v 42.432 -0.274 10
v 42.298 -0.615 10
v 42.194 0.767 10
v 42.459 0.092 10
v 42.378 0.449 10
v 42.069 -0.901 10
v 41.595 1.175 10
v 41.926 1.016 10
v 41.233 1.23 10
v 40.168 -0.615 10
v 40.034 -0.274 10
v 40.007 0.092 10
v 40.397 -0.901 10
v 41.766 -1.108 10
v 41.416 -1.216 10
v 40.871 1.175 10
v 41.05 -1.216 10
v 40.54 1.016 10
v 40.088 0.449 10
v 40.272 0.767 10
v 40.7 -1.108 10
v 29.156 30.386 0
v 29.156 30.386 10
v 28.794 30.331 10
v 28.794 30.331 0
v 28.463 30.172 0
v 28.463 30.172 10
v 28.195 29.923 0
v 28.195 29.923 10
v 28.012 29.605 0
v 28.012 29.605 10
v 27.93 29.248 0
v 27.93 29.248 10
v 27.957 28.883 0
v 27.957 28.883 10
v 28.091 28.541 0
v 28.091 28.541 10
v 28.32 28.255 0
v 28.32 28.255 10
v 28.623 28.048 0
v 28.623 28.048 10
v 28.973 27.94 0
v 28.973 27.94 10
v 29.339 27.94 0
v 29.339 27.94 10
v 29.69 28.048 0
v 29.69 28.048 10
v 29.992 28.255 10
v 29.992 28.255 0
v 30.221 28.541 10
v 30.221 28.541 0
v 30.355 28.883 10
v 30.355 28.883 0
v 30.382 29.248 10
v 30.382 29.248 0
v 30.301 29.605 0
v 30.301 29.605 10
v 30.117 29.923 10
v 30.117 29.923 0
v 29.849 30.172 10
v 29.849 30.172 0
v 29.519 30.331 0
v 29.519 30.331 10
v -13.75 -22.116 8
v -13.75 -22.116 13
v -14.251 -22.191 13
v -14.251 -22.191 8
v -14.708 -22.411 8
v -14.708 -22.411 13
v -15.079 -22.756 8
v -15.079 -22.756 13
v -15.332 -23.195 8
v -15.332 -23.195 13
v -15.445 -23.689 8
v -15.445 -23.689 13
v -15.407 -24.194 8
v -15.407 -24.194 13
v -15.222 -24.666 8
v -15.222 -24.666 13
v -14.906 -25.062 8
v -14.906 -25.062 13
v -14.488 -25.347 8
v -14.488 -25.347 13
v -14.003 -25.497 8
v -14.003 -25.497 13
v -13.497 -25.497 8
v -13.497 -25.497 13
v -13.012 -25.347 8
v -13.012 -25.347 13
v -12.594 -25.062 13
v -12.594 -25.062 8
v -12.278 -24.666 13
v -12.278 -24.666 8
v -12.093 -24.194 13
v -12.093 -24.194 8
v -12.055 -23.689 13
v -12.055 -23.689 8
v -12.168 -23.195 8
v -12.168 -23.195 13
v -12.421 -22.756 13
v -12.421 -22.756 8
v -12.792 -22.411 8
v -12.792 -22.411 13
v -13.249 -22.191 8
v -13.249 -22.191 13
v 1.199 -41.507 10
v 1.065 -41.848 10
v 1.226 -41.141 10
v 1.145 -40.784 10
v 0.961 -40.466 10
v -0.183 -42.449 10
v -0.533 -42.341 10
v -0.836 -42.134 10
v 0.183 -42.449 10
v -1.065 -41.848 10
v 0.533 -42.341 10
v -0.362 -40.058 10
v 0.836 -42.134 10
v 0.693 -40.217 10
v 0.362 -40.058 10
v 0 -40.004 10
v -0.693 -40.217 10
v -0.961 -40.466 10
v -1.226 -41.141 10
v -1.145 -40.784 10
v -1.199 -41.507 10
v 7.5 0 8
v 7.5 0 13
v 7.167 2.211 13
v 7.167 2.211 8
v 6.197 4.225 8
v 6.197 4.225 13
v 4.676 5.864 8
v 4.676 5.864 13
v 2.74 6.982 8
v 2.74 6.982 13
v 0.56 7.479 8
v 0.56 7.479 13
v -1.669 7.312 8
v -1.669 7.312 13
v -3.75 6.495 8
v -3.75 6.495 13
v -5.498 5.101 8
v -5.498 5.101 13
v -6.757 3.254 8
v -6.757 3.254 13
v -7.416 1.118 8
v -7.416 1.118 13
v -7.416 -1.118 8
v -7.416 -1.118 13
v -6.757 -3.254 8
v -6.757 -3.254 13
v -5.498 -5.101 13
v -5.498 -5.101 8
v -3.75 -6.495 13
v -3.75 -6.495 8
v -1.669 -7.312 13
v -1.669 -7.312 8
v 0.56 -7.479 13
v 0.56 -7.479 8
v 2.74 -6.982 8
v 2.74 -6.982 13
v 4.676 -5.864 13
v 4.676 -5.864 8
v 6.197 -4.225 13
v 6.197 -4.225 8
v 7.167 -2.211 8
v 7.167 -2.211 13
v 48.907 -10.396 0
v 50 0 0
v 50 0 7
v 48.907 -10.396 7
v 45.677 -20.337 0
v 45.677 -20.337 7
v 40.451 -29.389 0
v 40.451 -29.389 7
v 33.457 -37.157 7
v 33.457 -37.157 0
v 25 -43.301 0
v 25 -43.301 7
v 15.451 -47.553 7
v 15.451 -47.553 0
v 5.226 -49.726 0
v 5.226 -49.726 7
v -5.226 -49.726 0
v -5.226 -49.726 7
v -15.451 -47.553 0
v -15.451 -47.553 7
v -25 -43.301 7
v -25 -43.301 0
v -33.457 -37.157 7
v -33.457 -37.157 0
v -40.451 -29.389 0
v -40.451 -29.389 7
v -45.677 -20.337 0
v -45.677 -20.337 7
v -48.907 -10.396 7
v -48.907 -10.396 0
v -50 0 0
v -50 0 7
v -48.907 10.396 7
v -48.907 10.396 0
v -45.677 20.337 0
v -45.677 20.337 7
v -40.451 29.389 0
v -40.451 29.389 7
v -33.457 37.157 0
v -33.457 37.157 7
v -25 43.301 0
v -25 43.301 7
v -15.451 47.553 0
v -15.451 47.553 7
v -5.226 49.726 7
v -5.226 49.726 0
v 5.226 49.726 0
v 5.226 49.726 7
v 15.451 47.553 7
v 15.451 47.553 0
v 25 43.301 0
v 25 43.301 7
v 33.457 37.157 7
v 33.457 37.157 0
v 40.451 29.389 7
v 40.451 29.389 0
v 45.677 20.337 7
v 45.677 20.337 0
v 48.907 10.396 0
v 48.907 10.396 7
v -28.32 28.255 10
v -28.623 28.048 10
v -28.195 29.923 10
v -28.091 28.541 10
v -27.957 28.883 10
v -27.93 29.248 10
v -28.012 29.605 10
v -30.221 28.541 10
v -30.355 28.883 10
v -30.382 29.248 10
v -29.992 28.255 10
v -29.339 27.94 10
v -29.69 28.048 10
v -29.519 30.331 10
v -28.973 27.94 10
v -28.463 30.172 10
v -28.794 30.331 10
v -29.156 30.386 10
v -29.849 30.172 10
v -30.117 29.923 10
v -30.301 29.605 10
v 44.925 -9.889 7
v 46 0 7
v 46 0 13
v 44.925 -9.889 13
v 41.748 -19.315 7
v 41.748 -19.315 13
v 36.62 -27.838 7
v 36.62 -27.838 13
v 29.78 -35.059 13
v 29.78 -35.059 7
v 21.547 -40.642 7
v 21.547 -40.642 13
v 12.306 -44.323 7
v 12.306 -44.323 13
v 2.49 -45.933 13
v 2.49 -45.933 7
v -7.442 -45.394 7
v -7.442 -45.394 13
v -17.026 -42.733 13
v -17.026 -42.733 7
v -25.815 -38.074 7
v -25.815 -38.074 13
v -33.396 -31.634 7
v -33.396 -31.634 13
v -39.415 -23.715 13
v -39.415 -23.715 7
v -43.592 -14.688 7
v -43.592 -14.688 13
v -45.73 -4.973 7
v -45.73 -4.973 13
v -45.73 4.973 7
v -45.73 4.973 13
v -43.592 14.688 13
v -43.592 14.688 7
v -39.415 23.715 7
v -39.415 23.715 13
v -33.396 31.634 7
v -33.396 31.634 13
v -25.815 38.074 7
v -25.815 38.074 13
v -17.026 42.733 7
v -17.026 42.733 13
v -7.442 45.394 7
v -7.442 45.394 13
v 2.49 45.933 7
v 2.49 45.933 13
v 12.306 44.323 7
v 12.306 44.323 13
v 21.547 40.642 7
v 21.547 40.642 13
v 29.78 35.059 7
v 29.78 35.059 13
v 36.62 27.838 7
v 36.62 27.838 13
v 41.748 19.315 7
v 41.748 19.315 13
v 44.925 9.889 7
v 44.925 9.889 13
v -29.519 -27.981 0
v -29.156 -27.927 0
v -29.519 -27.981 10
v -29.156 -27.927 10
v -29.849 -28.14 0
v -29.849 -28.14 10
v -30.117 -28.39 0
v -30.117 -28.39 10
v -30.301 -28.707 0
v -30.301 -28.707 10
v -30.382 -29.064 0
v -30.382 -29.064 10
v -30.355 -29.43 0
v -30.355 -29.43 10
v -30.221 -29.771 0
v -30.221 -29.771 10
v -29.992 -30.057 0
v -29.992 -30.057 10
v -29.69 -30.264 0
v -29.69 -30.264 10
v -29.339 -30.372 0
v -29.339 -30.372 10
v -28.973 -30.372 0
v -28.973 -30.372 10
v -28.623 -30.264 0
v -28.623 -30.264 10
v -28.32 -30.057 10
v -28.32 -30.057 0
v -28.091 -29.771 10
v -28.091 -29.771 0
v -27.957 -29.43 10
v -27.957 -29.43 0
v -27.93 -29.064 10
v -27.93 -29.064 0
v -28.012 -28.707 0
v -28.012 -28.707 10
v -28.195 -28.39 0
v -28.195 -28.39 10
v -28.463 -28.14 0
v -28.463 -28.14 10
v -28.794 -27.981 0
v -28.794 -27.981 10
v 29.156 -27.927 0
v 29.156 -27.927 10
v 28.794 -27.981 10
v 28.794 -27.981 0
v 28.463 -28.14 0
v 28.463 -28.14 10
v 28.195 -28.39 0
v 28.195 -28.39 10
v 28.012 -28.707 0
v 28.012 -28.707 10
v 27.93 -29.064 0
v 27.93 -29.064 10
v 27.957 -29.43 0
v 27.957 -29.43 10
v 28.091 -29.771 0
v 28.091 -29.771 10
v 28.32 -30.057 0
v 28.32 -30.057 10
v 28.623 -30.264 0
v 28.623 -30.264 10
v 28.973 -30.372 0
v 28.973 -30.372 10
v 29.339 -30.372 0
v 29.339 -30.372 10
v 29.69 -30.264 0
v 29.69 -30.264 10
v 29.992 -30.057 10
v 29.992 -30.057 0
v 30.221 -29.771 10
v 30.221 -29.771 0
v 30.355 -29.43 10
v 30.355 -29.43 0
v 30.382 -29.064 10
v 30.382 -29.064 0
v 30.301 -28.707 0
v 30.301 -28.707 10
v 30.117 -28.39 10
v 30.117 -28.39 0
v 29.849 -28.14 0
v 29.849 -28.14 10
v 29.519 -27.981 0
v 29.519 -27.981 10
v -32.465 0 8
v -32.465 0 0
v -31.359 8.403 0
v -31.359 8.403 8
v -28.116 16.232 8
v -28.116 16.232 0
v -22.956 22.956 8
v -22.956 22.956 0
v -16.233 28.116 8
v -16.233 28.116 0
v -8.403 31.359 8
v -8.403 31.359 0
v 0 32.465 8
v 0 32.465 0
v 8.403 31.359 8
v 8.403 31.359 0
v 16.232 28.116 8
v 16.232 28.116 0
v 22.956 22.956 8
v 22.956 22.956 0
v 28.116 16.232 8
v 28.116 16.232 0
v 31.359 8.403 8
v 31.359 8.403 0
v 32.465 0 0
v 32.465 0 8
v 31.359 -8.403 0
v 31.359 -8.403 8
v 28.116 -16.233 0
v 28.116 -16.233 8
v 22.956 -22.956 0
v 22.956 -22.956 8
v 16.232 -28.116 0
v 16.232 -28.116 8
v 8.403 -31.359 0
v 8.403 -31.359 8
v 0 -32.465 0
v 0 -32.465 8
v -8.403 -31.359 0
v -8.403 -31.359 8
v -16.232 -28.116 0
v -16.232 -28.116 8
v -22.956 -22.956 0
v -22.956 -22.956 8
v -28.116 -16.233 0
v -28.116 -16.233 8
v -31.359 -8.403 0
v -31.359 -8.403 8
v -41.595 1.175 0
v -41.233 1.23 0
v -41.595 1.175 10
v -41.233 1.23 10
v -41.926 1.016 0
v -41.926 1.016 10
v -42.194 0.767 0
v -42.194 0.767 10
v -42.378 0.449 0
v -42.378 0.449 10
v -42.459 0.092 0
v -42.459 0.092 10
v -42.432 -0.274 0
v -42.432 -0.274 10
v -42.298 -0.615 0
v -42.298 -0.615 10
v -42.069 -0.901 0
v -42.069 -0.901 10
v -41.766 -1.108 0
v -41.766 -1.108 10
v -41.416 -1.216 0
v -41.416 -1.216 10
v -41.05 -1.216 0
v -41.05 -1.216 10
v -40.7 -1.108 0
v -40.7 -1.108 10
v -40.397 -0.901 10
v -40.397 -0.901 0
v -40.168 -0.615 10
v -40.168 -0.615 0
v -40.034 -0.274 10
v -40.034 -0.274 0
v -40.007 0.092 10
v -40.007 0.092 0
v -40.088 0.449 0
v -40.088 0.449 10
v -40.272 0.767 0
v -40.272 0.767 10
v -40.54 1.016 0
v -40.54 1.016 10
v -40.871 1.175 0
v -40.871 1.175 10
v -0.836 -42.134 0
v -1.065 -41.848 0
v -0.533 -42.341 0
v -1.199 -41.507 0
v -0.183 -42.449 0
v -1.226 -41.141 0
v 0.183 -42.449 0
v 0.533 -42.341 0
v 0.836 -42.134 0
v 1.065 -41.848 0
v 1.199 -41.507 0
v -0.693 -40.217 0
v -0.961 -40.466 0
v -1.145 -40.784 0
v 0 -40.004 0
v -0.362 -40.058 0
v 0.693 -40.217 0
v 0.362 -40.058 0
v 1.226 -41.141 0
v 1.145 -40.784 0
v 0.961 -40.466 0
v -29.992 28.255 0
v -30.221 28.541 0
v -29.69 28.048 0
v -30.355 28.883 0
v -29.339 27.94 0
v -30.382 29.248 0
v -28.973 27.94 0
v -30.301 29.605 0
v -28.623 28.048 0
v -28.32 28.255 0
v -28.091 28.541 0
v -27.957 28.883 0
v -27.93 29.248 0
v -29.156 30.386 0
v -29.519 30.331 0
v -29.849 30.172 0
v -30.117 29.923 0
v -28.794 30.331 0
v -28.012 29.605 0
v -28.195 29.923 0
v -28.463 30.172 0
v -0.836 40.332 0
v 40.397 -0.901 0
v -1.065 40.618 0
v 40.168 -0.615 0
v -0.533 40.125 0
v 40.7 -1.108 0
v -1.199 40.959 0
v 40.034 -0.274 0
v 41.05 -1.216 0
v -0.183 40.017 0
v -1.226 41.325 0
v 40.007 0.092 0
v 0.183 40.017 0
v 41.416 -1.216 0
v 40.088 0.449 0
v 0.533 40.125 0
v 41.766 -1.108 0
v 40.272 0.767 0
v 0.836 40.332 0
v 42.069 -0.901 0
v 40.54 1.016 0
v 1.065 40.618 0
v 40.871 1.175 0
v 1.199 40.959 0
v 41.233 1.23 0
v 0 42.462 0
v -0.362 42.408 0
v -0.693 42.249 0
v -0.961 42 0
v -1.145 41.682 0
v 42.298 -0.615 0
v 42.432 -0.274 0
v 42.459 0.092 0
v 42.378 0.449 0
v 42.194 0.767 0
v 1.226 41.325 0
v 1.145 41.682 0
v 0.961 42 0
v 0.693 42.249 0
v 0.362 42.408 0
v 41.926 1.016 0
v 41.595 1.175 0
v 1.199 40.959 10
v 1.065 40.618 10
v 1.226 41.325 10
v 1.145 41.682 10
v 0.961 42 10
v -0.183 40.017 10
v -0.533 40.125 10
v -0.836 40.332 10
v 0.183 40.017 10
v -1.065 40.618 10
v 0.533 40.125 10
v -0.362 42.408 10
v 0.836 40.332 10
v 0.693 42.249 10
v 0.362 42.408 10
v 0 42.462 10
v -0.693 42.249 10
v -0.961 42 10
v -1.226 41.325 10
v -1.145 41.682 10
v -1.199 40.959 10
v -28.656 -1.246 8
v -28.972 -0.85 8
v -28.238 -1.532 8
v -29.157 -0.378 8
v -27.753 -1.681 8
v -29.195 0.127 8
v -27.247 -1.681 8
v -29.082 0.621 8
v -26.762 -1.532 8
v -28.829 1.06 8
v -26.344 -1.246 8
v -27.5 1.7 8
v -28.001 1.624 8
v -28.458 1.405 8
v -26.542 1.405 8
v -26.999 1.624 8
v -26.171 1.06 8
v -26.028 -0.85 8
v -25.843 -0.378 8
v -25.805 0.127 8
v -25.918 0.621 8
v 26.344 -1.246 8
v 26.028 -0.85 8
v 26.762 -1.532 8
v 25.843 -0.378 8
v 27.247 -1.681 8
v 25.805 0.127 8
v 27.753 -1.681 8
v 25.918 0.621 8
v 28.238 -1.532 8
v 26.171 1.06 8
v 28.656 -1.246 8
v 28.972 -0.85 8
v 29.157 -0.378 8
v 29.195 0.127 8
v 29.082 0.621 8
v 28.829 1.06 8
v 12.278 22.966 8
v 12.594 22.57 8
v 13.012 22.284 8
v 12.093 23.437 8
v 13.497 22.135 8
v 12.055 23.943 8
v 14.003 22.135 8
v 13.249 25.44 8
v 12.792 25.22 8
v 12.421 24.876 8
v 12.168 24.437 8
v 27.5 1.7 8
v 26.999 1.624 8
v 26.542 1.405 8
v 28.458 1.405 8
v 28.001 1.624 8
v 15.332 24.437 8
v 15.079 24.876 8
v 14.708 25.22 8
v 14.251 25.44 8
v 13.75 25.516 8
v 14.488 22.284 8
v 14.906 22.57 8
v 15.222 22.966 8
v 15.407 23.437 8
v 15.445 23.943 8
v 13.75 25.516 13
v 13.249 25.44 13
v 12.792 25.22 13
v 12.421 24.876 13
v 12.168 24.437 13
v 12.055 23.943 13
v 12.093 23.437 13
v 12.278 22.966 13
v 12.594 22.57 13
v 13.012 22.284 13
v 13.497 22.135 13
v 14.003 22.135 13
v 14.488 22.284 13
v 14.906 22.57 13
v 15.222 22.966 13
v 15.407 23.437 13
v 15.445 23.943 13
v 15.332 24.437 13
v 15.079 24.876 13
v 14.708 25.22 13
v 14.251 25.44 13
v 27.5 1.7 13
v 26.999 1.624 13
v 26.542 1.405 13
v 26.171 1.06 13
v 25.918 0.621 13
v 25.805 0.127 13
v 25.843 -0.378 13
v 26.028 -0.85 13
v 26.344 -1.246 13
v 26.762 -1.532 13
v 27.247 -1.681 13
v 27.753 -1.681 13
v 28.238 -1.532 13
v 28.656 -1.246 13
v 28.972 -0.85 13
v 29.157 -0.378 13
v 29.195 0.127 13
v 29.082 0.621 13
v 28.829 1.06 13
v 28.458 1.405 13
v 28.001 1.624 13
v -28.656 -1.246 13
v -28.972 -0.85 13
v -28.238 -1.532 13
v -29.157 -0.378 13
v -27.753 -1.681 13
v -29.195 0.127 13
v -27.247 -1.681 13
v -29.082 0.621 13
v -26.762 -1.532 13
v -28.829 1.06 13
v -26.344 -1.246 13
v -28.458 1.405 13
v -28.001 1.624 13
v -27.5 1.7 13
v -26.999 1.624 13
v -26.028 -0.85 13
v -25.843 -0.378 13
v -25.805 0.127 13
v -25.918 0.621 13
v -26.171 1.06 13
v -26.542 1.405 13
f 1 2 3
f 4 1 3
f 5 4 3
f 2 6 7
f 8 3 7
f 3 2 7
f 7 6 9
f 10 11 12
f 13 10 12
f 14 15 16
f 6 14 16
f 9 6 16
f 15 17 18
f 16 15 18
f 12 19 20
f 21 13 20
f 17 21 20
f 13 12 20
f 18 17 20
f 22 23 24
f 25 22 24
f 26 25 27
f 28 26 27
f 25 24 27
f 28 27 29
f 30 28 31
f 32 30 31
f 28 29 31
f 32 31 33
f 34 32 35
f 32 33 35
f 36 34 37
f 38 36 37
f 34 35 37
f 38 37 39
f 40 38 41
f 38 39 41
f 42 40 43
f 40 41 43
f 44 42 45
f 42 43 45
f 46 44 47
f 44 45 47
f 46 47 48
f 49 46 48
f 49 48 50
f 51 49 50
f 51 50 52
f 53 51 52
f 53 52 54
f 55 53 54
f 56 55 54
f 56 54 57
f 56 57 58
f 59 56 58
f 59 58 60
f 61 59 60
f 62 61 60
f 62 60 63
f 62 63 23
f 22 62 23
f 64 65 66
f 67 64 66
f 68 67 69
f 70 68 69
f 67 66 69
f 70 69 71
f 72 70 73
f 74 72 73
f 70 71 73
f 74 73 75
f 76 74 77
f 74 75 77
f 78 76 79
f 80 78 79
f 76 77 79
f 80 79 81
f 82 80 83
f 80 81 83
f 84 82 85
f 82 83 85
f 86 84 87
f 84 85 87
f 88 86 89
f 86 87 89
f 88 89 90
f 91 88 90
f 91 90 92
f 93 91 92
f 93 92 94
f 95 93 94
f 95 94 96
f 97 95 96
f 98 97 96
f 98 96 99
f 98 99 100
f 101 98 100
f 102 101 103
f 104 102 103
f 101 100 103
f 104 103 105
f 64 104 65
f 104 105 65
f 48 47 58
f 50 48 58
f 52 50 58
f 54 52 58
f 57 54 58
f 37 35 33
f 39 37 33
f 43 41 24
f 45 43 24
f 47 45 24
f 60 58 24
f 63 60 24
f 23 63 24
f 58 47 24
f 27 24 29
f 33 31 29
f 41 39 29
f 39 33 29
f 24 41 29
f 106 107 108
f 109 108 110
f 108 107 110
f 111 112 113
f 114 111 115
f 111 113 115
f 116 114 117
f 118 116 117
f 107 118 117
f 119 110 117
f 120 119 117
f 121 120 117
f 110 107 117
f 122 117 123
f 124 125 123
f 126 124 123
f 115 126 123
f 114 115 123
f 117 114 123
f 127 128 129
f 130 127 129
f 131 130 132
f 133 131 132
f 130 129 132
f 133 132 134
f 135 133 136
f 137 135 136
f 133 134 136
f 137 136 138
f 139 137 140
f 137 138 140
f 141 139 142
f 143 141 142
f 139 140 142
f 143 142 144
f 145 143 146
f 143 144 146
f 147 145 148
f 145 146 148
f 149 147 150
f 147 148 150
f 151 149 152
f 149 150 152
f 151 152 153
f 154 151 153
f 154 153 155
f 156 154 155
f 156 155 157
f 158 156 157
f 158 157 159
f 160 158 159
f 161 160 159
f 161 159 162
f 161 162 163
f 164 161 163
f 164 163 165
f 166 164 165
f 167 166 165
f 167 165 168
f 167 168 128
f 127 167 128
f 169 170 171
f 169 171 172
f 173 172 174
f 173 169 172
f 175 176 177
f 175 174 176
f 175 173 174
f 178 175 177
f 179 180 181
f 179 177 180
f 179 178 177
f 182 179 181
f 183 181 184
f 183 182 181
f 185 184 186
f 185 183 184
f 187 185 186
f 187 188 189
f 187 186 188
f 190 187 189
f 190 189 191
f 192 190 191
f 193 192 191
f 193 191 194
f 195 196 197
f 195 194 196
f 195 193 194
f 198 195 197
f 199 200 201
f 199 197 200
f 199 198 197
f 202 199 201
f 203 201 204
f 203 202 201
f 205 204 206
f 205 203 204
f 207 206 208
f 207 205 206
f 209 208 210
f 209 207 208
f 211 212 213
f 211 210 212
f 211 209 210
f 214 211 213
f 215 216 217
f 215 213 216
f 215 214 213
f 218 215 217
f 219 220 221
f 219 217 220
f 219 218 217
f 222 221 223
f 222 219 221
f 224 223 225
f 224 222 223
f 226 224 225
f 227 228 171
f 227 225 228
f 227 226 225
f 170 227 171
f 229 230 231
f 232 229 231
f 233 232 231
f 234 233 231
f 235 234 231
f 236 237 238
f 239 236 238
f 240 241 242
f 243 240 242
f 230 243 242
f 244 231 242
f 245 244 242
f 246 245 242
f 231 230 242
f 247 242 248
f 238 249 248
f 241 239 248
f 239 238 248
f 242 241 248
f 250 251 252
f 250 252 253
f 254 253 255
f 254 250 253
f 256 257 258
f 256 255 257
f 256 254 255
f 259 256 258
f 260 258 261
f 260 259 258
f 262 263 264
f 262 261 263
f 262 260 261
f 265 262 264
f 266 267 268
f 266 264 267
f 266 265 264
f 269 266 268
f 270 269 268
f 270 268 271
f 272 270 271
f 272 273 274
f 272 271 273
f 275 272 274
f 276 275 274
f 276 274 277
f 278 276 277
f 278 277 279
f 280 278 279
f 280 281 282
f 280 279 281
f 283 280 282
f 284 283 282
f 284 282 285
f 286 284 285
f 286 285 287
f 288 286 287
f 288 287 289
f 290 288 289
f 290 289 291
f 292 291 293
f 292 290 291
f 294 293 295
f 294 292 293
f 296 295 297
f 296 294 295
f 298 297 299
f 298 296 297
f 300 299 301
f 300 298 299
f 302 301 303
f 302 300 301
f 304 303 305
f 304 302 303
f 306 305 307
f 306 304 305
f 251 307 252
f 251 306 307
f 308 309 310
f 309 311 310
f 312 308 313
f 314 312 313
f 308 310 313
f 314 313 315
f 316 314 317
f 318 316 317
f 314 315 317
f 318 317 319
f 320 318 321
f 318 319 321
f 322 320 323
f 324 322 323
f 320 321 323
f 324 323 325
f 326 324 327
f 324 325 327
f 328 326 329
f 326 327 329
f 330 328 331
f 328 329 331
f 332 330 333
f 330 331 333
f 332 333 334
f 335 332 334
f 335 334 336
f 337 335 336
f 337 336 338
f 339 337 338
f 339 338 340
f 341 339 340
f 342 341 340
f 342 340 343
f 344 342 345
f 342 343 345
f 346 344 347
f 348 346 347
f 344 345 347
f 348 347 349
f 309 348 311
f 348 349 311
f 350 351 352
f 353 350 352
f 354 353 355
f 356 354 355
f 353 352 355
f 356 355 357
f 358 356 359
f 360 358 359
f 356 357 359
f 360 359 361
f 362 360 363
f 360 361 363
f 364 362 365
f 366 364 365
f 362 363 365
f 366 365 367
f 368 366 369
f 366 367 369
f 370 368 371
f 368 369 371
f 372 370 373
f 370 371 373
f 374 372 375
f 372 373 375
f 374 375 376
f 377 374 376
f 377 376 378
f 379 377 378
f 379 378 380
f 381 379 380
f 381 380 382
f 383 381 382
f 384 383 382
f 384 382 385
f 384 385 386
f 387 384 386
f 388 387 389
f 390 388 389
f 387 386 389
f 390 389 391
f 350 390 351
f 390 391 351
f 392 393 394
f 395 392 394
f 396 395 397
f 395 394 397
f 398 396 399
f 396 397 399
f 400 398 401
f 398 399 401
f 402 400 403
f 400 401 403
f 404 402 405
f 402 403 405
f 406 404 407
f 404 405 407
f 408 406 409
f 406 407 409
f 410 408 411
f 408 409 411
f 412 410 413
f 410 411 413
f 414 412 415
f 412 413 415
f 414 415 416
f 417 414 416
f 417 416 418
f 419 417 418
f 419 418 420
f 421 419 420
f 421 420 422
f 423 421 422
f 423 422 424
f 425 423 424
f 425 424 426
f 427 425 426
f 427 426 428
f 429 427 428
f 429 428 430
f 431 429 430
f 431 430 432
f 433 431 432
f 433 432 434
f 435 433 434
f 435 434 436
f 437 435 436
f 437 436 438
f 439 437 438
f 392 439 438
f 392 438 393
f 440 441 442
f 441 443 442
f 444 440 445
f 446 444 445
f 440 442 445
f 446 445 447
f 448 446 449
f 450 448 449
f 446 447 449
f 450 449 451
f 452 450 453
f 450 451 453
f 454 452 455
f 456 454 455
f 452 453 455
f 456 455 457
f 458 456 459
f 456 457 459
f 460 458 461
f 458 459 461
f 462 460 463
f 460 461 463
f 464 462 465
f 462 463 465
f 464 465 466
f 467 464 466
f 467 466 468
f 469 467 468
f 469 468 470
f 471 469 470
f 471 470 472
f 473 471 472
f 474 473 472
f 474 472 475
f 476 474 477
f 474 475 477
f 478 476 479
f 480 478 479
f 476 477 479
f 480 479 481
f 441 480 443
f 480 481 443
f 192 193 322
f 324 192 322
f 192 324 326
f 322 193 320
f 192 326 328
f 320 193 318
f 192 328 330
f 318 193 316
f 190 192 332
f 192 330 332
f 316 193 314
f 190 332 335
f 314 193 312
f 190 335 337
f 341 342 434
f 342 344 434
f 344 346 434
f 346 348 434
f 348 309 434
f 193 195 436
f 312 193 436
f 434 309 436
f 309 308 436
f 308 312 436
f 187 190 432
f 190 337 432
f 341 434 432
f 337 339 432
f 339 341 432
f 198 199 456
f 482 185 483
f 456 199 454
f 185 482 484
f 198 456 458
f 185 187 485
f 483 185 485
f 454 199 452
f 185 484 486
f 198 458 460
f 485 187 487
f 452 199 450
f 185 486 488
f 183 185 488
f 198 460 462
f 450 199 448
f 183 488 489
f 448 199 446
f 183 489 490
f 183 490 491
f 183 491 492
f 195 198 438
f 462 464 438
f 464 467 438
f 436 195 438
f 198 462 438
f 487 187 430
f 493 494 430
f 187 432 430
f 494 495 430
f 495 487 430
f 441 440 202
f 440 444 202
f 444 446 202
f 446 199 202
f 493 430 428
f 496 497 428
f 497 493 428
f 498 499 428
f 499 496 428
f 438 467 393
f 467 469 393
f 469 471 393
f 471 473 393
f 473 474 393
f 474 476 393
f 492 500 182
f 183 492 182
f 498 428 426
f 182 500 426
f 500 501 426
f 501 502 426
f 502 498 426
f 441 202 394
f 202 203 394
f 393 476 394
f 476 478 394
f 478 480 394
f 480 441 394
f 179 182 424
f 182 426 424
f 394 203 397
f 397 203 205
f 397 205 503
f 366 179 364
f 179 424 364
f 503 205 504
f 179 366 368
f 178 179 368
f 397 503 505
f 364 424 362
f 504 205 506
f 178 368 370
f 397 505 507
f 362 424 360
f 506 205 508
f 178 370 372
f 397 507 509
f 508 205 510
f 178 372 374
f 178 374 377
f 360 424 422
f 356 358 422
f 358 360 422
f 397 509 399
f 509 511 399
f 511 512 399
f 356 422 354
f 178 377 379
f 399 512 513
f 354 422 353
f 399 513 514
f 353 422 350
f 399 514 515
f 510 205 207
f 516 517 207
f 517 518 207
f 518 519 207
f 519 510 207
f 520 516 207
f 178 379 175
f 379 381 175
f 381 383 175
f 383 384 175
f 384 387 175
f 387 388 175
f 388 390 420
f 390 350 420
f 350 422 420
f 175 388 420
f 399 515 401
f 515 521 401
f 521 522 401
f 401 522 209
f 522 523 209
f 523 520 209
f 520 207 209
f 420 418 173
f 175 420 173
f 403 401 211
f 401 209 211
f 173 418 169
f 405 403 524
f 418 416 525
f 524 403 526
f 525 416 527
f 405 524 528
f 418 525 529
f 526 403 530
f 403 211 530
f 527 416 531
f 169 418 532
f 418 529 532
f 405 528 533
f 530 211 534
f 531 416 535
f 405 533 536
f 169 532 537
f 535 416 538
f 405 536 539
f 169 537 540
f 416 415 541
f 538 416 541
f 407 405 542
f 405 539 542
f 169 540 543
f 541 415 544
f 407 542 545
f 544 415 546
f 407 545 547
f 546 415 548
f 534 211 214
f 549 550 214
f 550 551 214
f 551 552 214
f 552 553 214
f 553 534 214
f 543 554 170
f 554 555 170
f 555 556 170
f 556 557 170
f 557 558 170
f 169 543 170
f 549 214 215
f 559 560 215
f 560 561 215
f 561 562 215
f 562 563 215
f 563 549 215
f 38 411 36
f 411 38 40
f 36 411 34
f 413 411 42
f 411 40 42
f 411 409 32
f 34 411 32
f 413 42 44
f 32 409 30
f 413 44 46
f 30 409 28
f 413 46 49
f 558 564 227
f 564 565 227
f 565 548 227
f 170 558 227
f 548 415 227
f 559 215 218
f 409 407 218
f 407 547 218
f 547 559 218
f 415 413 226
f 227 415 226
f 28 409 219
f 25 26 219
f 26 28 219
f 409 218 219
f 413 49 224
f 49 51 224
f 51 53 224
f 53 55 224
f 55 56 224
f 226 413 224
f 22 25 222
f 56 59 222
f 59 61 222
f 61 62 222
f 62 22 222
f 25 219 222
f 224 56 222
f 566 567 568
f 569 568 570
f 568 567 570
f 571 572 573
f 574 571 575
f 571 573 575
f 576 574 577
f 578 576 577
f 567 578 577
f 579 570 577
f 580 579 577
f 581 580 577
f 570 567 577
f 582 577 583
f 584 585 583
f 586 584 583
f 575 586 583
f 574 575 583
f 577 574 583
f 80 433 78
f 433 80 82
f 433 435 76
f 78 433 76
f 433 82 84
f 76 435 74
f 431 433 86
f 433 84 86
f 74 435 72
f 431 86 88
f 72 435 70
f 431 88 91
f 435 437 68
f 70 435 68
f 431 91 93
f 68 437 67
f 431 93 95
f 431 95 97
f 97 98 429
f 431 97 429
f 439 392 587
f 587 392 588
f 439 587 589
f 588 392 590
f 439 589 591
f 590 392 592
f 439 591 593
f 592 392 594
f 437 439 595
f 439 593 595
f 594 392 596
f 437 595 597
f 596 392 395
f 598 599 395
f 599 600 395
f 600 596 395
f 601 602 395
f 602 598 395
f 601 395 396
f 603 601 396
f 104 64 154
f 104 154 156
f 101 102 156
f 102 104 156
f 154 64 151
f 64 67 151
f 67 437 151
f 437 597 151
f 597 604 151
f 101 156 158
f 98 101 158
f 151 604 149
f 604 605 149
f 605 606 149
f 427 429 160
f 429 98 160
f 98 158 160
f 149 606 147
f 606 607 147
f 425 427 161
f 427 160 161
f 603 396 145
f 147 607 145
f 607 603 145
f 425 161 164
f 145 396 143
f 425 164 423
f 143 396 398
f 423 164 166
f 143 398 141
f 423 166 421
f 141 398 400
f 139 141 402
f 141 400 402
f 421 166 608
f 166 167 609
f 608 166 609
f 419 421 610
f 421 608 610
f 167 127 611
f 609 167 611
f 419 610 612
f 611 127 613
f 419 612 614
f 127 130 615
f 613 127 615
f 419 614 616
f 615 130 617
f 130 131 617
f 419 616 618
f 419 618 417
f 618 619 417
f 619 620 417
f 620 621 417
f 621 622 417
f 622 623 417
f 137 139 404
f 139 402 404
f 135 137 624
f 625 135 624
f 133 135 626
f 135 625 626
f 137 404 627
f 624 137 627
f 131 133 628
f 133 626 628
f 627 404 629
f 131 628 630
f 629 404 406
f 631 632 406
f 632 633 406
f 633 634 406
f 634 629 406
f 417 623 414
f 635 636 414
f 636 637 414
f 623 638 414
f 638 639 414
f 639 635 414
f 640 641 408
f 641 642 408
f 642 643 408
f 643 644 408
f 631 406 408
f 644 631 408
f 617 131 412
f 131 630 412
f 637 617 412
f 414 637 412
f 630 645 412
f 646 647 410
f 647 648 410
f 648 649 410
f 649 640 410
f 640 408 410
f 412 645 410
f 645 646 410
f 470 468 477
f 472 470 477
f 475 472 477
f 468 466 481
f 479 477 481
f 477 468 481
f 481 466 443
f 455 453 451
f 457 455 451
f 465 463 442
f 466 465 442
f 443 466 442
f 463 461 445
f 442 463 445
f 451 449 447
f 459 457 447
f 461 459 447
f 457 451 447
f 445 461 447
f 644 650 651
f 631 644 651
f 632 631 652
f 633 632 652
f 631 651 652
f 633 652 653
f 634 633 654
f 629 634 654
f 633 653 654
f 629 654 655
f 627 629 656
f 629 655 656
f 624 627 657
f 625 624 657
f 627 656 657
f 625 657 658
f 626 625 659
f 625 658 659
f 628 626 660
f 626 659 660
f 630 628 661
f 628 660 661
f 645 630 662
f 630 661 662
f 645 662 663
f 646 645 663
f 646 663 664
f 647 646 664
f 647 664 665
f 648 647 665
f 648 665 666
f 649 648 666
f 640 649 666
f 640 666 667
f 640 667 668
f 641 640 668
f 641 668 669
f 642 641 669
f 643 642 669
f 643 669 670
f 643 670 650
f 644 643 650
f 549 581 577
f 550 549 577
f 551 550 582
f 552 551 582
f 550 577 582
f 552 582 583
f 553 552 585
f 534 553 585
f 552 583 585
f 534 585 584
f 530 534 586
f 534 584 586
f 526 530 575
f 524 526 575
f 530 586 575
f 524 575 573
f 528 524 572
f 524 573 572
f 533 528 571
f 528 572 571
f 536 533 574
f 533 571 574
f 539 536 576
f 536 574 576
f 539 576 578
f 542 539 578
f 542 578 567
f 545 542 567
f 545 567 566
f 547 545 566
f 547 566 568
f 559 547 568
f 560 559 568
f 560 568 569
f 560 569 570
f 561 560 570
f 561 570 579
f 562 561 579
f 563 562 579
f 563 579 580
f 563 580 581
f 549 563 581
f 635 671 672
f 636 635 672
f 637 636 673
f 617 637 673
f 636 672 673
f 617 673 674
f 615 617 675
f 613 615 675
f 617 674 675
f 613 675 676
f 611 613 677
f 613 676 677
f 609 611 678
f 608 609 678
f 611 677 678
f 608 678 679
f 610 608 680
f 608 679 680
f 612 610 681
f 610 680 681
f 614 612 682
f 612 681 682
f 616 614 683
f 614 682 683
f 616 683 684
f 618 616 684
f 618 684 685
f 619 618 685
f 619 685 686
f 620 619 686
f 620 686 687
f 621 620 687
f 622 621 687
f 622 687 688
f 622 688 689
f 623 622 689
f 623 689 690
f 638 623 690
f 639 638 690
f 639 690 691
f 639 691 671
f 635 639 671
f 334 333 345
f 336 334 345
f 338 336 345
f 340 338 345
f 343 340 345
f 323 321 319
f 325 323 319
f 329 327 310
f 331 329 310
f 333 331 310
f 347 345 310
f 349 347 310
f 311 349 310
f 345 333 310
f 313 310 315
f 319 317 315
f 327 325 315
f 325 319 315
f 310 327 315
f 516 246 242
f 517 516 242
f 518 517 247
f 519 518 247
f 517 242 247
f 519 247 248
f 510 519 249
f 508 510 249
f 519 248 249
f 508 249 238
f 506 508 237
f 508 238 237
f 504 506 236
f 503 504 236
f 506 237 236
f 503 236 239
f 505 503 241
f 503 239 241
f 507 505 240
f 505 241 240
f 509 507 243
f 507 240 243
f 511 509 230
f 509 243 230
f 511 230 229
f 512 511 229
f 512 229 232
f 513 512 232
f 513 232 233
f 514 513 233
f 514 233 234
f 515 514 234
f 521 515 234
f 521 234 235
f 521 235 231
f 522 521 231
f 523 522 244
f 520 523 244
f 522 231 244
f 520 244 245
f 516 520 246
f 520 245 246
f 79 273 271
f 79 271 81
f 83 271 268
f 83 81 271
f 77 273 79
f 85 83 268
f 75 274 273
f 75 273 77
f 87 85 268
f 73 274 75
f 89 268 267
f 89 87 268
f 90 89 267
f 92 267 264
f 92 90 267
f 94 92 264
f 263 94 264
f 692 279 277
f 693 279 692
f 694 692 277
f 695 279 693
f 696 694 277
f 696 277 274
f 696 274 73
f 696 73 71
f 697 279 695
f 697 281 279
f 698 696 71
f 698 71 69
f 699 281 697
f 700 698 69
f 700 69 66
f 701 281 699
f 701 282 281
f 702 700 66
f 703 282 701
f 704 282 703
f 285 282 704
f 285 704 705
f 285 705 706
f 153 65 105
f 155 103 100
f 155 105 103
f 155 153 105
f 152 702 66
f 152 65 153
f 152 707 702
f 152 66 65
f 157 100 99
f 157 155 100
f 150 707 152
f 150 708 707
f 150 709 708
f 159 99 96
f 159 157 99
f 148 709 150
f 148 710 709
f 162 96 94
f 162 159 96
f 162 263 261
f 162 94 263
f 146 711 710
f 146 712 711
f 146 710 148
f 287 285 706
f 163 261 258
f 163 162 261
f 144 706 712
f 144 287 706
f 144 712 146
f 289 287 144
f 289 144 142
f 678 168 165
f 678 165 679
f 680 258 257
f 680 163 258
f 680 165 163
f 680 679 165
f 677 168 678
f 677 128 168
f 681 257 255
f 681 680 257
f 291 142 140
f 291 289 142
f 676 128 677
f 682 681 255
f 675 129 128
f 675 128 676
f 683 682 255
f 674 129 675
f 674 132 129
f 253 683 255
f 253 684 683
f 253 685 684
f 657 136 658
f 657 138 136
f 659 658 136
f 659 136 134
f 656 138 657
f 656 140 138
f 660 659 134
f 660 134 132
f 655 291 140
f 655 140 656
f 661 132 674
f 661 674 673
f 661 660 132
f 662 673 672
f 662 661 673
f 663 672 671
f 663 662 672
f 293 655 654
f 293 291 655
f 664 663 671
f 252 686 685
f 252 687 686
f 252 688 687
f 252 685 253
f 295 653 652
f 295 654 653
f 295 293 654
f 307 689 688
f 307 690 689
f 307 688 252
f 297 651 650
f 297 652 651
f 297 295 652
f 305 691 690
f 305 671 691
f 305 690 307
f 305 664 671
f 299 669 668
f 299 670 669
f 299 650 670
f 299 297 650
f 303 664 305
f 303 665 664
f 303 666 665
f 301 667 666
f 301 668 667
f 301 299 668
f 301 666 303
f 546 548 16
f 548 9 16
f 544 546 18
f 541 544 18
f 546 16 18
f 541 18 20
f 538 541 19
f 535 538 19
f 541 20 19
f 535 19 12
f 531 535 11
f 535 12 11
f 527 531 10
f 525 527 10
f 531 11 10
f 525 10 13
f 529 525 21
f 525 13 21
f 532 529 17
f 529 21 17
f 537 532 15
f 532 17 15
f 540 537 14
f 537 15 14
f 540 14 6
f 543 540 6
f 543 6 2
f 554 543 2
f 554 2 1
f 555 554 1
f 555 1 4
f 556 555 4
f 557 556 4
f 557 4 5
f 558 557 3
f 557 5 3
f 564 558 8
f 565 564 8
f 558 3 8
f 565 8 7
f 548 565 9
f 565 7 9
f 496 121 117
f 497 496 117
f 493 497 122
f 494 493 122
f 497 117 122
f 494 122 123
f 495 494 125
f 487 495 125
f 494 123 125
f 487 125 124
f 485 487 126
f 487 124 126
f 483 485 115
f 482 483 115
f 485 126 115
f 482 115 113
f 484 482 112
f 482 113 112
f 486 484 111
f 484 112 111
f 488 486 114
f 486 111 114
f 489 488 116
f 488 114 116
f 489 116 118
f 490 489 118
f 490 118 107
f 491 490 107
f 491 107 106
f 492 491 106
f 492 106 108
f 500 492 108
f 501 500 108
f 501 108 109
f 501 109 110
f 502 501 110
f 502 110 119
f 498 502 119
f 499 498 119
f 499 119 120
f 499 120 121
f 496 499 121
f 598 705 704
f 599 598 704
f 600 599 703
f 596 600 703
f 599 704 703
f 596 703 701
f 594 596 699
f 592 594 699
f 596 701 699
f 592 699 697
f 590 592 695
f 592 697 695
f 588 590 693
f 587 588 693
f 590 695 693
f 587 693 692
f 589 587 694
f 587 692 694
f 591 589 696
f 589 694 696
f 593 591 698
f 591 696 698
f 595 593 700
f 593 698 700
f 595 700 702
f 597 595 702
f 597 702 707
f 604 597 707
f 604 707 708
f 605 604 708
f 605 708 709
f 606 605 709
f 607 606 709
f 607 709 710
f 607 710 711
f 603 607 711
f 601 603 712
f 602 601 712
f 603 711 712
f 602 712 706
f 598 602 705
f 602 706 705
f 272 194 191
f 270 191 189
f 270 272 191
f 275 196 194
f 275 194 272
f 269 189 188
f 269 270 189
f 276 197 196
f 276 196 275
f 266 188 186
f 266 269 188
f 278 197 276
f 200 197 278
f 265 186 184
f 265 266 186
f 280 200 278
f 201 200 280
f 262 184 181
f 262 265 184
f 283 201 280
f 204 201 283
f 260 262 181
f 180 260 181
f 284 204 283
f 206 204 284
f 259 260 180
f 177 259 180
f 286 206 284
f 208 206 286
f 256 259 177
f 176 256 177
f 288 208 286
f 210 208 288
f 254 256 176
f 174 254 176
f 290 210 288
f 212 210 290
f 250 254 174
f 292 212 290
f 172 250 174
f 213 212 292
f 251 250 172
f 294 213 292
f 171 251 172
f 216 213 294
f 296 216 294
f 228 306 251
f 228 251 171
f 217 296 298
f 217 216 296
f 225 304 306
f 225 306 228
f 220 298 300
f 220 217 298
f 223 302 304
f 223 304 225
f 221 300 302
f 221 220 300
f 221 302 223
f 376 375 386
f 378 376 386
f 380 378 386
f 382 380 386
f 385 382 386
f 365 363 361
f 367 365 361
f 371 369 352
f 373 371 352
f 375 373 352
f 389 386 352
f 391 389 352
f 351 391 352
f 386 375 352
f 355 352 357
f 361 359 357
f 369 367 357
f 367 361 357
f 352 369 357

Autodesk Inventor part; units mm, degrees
ref_plane "YZ Plane" through (0, 0, 0) normal (1, 0, 0) x (0, 1, 0)
sketch "Sketch1" plane through (0, 0, 0) normal (0, 0, 1) x (1, 0, 0)
  circle A0 centre (0, 0) radius 50
  circle A1 centre (0, 0) radius 12.5
  circle A2 centre (0, 0) radius 14.5
  line L0 (-15.5, -15.5) -> (15.5, -15.5) construction
  line L1 (15.5, -15.5) -> (15.5, 15.5) construction
  line L2 (15.5, 15.5) -> (-15.5, 15.5) construction
  line L3 (-15.5, 15.5) -> (-15.5, -15.5) construction
  line L4 (-15.5, -15.5) -> (15.5, 15.5) construction
  line L5 (15.5, -15.5) -> (-15.5, 15.5) construction
  dimension "Diametro" = 100
  dimension "d1" = 25
  dimension "d2" = 2
  dimension "d8" = 31
extrude "Extrusion1" add sketch "Sketch1" along normal blind 7 contours A0 | A2
extrude "Extrusion2" add sketch "Sketch1" along normal blind 100 contours A2
ref_plane "Work Plane1" through (0, 0, 22) normal (0, 0, 1) x (1, 0, 0)
sketch "Sketch2" plane through (0, 0, 22) normal (0, 0, 1) x (1, 0, 0)
  arc A0 (2.5, 24.8747) -> (-2.5, 24.8747) centre (0, 0) ccw
  line L0 (2.5, 24.8747) -> (2.5, 14.2829)
  line L1 (-2.5, 24.8747) -> (-2.5, 14.2829)
  line L2 (0, -70) -> (0, 70) projected
  circle A1 centre (0, 0) radius 14.5 projected
  point P0 (0, 25)
  dimension "d24" = 5
  dimension "d25" = 25
  dimension "Dedos" = 5
extrude "Extrusion3" add sketch "Sketch2" along normal blind 15 contours L0 A1 L2 A0 | L2 A1 L1 A0
sketch "Sketch3" plane through (0, 0, 0) normal (1, 0, 0) x (0, 1, 0)
  line L0 (25, 37) -> (24.8747, 37) projected
  line L1 (14.2829, 22) -> (14.5, 22) projected
  line L2 (25, 22) -> (25, 37) projected
  line L3 (14.2829, 22) -> (14.2829, 37) projected
  circle A0 centre (25.74, 29.5) radius 1.5
  line L4 (0, -7.4) -> (0, 44.4) projected
  point P0 (0, 0)
  point P1 (25, 29.5)
  dimension "d31" = 3
  dimension "d92" = 25.74
fillet "Fillet2" radius 8 1 edges at (0, 25, 22)
pattern_circular "Circular Pattern1" count 4 over 360 about axis through (0, 0, 0) along (0, 0, 1) of "Fillet2", "Extrusion3"
ref_plane "Plano de trabajo2" through (0, 0, 54) normal (0, 0, 1) x (1, 0, 0)
sketch "Boceto4" plane through (0, 0, 54) normal (0, 0, 1) x (1, 0, 0)
  circle A0 centre (0, 0) radius 17.5
  circle A1 centre (0, 0) radius 14.5 projected
  line L0 (4, -23.75) -> (4, -26.75) projected
  dimension "d54" = 35
extrude "Extrusión5" add sketch "Boceto4" against normal up to surface (47 mm away)
sketch "Boceto5" plane through (0, 0, 37) normal (0, 0, 1) x (0, 1, 0)
  arc A0 (-2.5, -17.3205) -> (2.5, -17.3205) centre (0, 0) ccw projected
  line L0 (-2.5, -17.3205) -> (-2.5, -24.8747) projected
  arc A1 (-2.5, -24.8747) -> (2.5, -24.8747) centre (0, 0) ccw projected
  line L1 (2.5, -24.8747) -> (2.5, -17.3205) projected
  circle A2 centre (0, 0) radius 14.5 projected
  line L2 (2.5, -17.3205) -> (2.5, -14.2829)
  line L3 (-2.5, -17.3205) -> (-2.5, -14.2829)
extrude "Extrusión6" add sketch "Boceto5" along normal blind 20 contours L3 A2 L2 A0 | A0 L1 A1 L0
fillet "Empalme4" radius 8 1 edges at (25, 0, 57)
pattern_circular "Patrón circular2" count 4 over 360 about axis through (0, 0, 54) along (0, 0, -1) of "Extrusión6", "Empalme4"
chamfer "Chaflán1" distance 2 angle 45 1 edges at (-14.5, 0, 100)
sketch "Boceto6" plane through (0, 0, 7) normal (0, 0, 1) x (1, 0, 0)
  circle A0 centre (0, 0) radius 50 projected
  arc A1 (17.3205, 2.5) -> (2.5, 17.3205) centre (0, 0) ccw construction
  line L0 (0, 0) -> (32.476, 18.75) construction
  arc A2 (17.3205, 2.5) -> (2.5, 17.3205) centre (0, 0) ccw construction
  point P0 (16.25, -6.4952)
  point P1 (16.25, 6.4952)
  point P2 (0, 37.5)
  point P3 (-32.476, 18.75)
  point P4 (-32.476, -18.75)
  point P5 (0, -37.5)
  point P6 (32.476, -18.75)
  point P7 (10.8253, 13.75)
  point P8 (15.1554, 8.75)
  dimension "d73" = 360
  dimension "d91" = 37.5
sketch "Boceto8" plane through (0, 0, 7) normal (0, 0, 1) x (1, 0, 0)
  circle A0 centre (0, 0) radius 17.5 projected
  circle A1 centre (0, 0) radius 50 projected
  circle A2 centre (0, 0) radius 46
  dimension "Espesor" = 4
extrude "Extrusión8" add sketch "Boceto8" along normal blind 6 contours A2
sketch "Boceto9" plane through (2.5, 14.0104, 54) normal (1, 0, 0) x (0, -1, 0)
  line L0 (16.5104, 0) -> (28.2932, 0) projected
  line L1 (-35.9896, 54) -> (64.0104, 54) projected
  point P0 (1.4018, 24.5)
  point P1 (22.4018, 0)
  dimension "d124" = 21
  dimension "d125" = 29.5
hole "Agujero4" at (2.5, 12.6086, 29.5) direction (-1, 0, 0) diameter 3.4 depth 5 clearance for "Tornillo de cabeza plana avellanada ISO 2009/7046" size "M3" standard "ISO"
pattern_circular "Patrón circular3" count 4 over 360 about axis through (0, 0, 54) along (0, 0, -1) of "Agujero4"
sketch "Boceto13" plane through (0, 0, 13) normal (0, 0, 1) x (1, 0, 0)
  point P0 (0, 0)
sketch "Boceto15" plane through (0, 0, 0) normal (0, 0, -1) x (-1, 0, 0)
  circle A0 centre (0, 0) radius 27.5 construction
  point P0 (27.5, 0)
  point P1 (13.75, 23.8157)
  point P2 (-13.75, 23.8157)
  point P3 (-27.5, 0)
  point P4 (-13.75, -23.8157)
  point P5 (13.75, -23.8157)
  dimension "d134" = 55
  dimension "d137" = 360
hole "Agujero8" at (-13.75, -23.8157, 0) at (13.75, -23.8157, 0) at (27.5, 0, 0) at (13.75, 23.8157, 0) at (-13.75, 23.8157, 0) at (-27.5, 0, 0) direction (0, 0, 1) diameter 3.4 end through all clearance for "Tornillo de cabeza cilíndrica ranurada ISO 1207" size "M3" standard "ISO"
sketch "Boceto16" plane through (0, 0, 0) normal (0, 0, -1) x (-1, 0, 0)
  circle A0 centre (0, 0) radius 32.465
  dimension "d146" = 64.93
extrude "Extrusión10" cut sketch "Boceto16" against normal blind 8
sketch "Boceto18" plane through (0, 0, 0) normal (0, 0, -1) x (-1, 0, 0)
  point P0 (0, 0)
  point P1 (-41.233, 0)
  point P2 (-29.1561, -29.1561)
  point P3 (0, -41.233)
  point P4 (29.1561, -29.1561)
  point P5 (41.233, 0)
  point P6 (29.1561, 29.1561)
  point P7 (0, 41.233)
  point P8 (-29.1561, 29.1561)
  dimension "d162" = 41.233
  dimension "d165" = 360
hole "Agujero10" at (41.233, 0, 0) at (29.1561, -29.1561, 0) at (0, -41.233, 0) at (-29.1561, -29.1561, 0) at (-41.233, 0, 0) at (-29.1561, 29.1561, 0) at (0, 41.233, 0) at (29.1561, 29.1561, 0) direction (0, 0, 1) diameter 2.459 depth 10 thread size "M3x0.5" class "6H" standard "ISO Metric profile"
sketch "Sketch19" plane through (14.2829, -2.5, 54) normal (0, -1, 0) x (1, 0, 0)
  circle A0 centre (6.7167, -24.5) radius 1.7
  line L0 (3.0377, 0) -> (3.0377, -31.9844) projected
  line L1 (3.0377, 0) -> (-11.7829, 0) projected
  point P0 (-14.2829, -54)
  dimension "d174" = 3.4
  dimension "d175" = 3.679
  dimension "d176" = 24.5
hole "Hole11" at (20.9995, -2.5, 29.5) direction (0, 1, 0) diameter 4 depth 5
pattern_circular "Circular Pattern4" count 4 over 360 about axis through (0, 0, 0) along (0, 0, 1) of "Hole11"
sketch "Sketch20" plane through (0, 0, 13) normal (0, 0, 1) x (1, 0, 0)
  circle A0 centre (-27.5, 0) radius 1.7 projected
  circle A1 centre (-13.75, 23.8157) radius 1.7 projected
  circle A2 centre (13.75, 23.8157) radius 1.7 projected
  circle A3 centre (27.5, 0) radius 1.7 projected
  circle A4 centre (13.75, -23.8157) radius 1.7 projected
  circle A5 centre (-13.75, -23.8157) radius 1.7 projected
  circle A6 centre (0, 0) radius 46 projected
  circle A7 centre (0, 0) radius 17.5 projected
  circle A8 centre (0, 0) radius 46
extrude "Extrusion12" cut sketch "Sketch20" along normal up to surface contours A6 | A7
sketch "Sketch21" plane through (0, 0, 13) normal (0, 0, 1) x (1, 0, 0)
  circle A0 centre (0, 0) radius 12.5 projected
  circle A1 centre (-27.5, 0) radius 1.7 projected
  circle A2 centre (-13.75, 23.8157) radius 1.7 projected
  circle A3 centre (13.75, 23.8157) radius 1.7 projected
  circle A4 centre (27.5, 0) radius 1.7 projected
  circle A5 centre (13.75, -23.8157) radius 1.7 projected
  circle A6 centre (-13.75, -23.8157) radius 1.7 projected
  circle A7 centre (0, 0) radius 46 projected
  circle A8 centre (-13.75, 23.8157) radius 1.7
  circle A9 centre (13.75, -23.8157) radius 1.7
extrude "Extrusion13" add sketch "Sketch21" against normal up to surface (5 mm away) contours A2 | A5
sketch "Sketch23" plane through (0, 0, 13) normal (0, 0, 1) x (1, 0, 0)
  circle A0 centre (0, 0) radius 12.5 projected
  circle A1 centre (-27.5, 0) radius 1.7 projected
  circle A2 centre (13.75, 23.8157) radius 1.7 projected
  circle A3 centre (27.5, 0) radius 1.7 projected
  circle A4 centre (-13.75, -23.8157) radius 1.7 projected
  circle A5 centre (0, 0) radius 46 projected
  circle A6 centre (0, 0) radius 7.5
  dimension "d192" = 15
extrude "Extrusion14" add sketch "Sketch23" against normal up to surface (5 mm away) contours A0
equation "\"d24\" = Dedos"
equation "\"d91\" = 0.375 * Diametro"
properties part number "Soporte22" material "Aluminum 7075"
